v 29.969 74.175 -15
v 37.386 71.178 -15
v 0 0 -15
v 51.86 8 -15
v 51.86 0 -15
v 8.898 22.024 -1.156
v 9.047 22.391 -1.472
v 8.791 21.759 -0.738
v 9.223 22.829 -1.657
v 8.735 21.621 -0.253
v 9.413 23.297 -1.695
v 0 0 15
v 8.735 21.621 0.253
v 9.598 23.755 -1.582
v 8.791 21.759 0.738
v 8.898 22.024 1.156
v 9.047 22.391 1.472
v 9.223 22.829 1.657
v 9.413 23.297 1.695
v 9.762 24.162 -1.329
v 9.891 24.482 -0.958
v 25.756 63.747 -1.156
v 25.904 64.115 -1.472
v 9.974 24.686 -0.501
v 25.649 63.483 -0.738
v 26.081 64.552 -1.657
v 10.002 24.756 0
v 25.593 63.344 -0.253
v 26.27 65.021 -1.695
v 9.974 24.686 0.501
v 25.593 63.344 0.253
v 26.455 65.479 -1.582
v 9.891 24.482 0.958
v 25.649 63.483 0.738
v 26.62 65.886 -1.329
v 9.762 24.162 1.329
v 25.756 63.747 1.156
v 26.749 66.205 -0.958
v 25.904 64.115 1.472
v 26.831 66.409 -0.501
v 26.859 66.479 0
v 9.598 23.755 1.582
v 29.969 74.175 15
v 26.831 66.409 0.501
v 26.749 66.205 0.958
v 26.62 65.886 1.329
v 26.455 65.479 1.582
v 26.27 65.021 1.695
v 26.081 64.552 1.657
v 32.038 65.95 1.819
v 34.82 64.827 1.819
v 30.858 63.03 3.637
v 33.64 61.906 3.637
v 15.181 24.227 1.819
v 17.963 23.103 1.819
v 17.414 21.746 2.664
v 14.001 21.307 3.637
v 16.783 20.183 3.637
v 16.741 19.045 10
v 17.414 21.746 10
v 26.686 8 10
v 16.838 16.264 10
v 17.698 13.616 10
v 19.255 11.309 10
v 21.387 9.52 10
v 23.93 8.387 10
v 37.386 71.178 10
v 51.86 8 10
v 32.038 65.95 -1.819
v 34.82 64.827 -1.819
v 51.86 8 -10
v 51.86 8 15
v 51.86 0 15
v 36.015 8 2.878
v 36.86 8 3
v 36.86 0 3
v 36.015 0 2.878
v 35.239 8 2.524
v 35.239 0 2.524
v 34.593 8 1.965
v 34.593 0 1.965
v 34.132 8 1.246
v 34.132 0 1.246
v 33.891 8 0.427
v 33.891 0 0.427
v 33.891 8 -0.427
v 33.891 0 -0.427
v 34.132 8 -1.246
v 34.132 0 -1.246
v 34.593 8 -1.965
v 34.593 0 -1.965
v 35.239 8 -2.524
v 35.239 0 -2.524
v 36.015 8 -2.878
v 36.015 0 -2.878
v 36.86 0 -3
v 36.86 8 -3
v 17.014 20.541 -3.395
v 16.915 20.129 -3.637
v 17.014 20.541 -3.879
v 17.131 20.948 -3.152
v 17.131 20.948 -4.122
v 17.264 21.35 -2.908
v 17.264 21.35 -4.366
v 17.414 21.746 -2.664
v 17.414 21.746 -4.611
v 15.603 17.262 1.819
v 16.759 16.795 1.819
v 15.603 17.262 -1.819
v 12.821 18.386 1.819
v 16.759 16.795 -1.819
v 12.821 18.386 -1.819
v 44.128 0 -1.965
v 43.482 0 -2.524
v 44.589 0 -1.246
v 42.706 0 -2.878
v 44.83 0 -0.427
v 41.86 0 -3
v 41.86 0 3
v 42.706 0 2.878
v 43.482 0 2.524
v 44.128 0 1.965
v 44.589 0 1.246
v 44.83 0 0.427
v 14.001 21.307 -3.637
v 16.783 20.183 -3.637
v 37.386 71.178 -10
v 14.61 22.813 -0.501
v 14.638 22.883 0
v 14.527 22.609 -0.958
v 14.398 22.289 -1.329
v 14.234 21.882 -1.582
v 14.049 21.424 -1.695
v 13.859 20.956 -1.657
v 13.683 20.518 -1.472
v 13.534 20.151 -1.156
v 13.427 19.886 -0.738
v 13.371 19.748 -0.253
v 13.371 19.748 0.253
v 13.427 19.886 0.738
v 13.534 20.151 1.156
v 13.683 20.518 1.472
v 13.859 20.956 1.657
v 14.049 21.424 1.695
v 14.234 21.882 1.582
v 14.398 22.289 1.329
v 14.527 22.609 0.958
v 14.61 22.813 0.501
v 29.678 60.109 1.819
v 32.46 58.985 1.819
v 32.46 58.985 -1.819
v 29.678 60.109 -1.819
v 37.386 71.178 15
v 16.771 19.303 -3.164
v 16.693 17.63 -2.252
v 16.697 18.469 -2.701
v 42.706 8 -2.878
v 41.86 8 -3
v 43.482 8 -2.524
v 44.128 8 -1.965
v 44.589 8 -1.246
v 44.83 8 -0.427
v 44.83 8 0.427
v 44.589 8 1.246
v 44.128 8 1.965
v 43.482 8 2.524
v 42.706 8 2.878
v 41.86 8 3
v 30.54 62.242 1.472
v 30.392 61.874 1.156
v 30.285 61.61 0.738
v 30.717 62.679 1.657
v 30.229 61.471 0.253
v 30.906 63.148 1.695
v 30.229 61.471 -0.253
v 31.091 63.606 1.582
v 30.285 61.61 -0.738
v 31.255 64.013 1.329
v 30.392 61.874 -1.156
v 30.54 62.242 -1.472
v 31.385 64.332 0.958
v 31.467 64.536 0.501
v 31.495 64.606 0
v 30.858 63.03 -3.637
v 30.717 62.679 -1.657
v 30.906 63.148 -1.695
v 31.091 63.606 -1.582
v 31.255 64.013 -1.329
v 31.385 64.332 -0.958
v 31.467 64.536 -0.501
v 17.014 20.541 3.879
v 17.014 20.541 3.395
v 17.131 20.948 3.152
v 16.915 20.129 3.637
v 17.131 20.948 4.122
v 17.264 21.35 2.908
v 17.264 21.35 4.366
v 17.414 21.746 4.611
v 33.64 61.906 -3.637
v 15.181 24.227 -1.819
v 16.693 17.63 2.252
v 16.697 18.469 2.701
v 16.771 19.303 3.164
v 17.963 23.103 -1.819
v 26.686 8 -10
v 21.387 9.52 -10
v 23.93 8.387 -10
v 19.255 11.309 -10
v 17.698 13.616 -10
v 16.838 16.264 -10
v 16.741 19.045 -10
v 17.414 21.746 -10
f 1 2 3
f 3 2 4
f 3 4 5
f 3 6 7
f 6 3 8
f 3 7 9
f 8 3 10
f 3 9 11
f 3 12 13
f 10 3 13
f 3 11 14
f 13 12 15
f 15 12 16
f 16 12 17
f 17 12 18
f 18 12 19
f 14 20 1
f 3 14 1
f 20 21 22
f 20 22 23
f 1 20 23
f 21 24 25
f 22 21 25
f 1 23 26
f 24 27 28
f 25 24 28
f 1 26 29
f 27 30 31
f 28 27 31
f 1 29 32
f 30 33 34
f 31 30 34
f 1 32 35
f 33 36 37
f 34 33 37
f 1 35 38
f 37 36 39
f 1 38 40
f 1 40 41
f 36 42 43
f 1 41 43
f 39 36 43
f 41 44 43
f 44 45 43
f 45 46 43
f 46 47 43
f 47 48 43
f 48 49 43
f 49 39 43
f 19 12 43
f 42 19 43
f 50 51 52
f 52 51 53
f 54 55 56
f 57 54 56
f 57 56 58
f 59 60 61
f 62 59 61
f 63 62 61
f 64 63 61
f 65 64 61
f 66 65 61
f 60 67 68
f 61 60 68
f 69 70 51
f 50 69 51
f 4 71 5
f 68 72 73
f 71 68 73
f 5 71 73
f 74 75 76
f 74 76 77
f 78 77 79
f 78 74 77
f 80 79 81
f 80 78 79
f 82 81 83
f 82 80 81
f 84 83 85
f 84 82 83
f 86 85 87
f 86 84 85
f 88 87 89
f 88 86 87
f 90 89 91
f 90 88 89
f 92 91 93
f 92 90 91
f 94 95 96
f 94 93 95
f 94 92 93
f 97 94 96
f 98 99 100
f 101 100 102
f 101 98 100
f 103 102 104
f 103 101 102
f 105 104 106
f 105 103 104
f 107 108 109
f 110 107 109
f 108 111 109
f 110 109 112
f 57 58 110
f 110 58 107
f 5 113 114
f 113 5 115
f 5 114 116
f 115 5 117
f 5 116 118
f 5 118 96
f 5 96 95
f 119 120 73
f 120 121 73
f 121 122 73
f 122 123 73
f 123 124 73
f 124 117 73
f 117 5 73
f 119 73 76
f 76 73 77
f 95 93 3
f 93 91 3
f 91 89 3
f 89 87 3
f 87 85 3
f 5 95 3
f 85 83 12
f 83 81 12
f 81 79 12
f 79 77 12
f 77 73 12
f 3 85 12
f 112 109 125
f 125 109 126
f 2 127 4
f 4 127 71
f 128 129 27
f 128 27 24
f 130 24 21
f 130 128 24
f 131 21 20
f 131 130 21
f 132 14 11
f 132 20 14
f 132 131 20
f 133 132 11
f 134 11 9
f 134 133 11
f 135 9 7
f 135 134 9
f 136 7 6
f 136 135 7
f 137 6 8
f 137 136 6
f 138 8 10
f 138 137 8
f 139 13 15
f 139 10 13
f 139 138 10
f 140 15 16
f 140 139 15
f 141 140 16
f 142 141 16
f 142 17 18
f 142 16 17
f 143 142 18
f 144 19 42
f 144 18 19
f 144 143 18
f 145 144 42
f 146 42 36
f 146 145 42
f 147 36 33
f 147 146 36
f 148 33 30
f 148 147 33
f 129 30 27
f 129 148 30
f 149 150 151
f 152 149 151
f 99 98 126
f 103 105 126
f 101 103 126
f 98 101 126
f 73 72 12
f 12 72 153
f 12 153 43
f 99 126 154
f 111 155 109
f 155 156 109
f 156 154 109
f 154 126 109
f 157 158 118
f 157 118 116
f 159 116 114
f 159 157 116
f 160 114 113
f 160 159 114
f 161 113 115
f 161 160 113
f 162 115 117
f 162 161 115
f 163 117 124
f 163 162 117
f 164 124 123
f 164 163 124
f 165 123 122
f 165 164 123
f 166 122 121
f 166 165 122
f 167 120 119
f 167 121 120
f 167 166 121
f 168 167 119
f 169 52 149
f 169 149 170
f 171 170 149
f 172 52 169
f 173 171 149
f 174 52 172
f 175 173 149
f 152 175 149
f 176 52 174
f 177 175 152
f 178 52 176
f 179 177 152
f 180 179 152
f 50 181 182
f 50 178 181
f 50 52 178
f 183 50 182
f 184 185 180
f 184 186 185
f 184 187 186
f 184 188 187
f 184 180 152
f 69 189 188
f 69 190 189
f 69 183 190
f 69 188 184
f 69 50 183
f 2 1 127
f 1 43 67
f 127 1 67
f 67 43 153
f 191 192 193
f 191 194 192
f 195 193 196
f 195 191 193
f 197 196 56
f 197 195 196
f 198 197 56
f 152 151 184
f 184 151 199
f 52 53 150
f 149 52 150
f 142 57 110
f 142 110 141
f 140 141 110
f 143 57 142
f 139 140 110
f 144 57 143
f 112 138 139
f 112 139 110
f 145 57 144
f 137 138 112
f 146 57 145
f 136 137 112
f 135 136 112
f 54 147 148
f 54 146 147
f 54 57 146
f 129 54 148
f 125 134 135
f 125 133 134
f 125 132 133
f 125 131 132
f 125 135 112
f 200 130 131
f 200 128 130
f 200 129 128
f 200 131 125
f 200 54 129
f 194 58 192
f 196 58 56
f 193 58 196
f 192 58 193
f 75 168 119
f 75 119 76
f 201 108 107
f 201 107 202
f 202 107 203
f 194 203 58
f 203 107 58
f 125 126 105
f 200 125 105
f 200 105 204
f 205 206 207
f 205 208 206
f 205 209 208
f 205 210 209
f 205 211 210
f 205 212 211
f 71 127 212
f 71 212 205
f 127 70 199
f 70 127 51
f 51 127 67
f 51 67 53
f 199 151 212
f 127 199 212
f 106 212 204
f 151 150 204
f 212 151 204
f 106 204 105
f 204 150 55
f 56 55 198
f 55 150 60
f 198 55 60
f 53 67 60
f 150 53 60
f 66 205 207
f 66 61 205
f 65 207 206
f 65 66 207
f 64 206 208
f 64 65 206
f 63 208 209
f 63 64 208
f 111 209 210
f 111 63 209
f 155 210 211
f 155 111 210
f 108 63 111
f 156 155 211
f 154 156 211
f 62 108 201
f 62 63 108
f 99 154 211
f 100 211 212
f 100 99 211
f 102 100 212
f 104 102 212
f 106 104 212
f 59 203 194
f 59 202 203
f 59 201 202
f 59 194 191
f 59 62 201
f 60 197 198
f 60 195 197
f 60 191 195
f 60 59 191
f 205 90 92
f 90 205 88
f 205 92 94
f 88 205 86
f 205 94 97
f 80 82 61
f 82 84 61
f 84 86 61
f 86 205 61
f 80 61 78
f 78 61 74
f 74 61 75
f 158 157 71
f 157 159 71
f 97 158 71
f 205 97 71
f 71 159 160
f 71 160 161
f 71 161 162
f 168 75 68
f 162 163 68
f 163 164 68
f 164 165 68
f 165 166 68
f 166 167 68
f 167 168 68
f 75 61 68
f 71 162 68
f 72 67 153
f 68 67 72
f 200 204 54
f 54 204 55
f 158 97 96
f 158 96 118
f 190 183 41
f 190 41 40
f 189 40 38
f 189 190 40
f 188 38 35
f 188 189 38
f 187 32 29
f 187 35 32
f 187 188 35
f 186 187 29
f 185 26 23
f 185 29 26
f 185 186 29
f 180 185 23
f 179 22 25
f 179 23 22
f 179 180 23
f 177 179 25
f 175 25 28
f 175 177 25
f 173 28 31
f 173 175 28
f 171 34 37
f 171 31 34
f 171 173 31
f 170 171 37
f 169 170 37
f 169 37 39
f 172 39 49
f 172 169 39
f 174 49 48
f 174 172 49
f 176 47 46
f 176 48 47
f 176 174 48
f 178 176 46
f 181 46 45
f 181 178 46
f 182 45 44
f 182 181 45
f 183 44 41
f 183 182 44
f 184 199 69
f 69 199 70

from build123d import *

# Parameters (mm, degrees)
BOSS_EXTRUDE1_DEPTH           = 15
CUT_EXTRUDE1_DEPTH            = 86.172406393
RIB1_REACH                    = 97.349
SKETCH4_WALL_W                = 257.512394394
SKETCH4_WALL_H                = 5
M3_CLEARANCE_HOLE1_AT_2_COUNT = 2
M3_CLEARANCE_HOLE1_AT_2_PITCH = 45
CUT_EXTRUDE2_DEPTH            = 3
FILLET1_R                     = 10


with BuildPart() as part:
    # Sketch1 → Boss-Extrude1 (new, symmetric)
    with BuildSketch(Plane.XY):
        Polygon((0, 0), (29.968527473, 74.174708365), (37.38599831, 71.177855618), (11.860487748, 8), (51.860487748, 8), (51.860487748, 0), align=None)
    extrude(amount=BOSS_EXTRUDE1_DEPTH, both=True)

    # Sketch2 → Cut-Extrude1 (cut, through all)
    with BuildSketch(Plane(origin=(0.379940125, 8, 0), x_dir=(1, 0, 0), z_dir=(0, 1, 0))):
        with BuildLine():
            Line((41.480547623, -3), (36.480547623, -3))
            ThreePointArc((36.480547623, -3), (33.480547623, 0), (36.480547623, 3))
            Line((36.480547623, 3), (41.480547623, 3))
            ThreePointArc((41.480547623, 3), (44.480547623, 0), (41.480547623, -3))
        make_face()
    extrude(amount=-CUT_EXTRUDE1_DEPTH, mode=Mode.SUBTRACT)

    # Sketch4 wall → Rib1 (add, up to next)
    with BuildSketch(Plane(origin=(44.623243029, 39.588927809, 15), x_dir=(0.223320905083, -0.974744978624, 0), z_dir=(0.974744978624, 0.223320905083, 0)), mode=Mode.PRIVATE) as rib1_sk1:
        with Locations((0, 2.5)):
            Rectangle(SKETCH4_WALL_W, SKETCH4_WALL_H)
    rib1_tool1 = extrude(rib1_sk1.sketch, amount=-RIB1_REACH, mode=Mode.PRIVATE) - part.part
    rib1 = rib1_tool1.solids().sort_by_distance((44.623243029, 39.588927809, 15))[0]
    add(rib1)

    # Mirror1: Rib1 across plane
    add(rib1.mirror(Plane.XY))

    # Sketch7 → M3 Clearance Hole1 (revolve, cut)
    with BuildSketch(Plane(origin=(33.639932376, 61.906017072, 0), x_dir=(0.37460659341591607, 0.9271838545667858, 0), z_dir=(0, 0, 1))):
        Polygon((0, 0), (0, 35.786334818), (1.7, 35.786334818), (1.7, 0.025), (1.725, 0), align=None)
    m3_clearance_hole1 = revolve(axis=Axis((39.527549852, 59.527265204, 0), (-0.9271838545667858, 0.37460659341591607, 0)), mode=Mode.SUBTRACT)

    # M3 Clearance Hole1 at 2: M3 Clearance Hole1 ×2
    with Locations(*[Vector(-0.37460659341591607, -0.9271838545667858, 0) * (i * M3_CLEARANCE_HOLE1_AT_2_PITCH) for i in range(1, M3_CLEARANCE_HOLE1_AT_2_COUNT)]):
        add(m3_clearance_hole1, mode=Mode.SUBTRACT)

    # Sketch8 → Cut-Extrude2 (cut)
    with BuildSketch(Plane(origin=(7.417470837, -2.996852747, 0), x_dir=(0, 0, -1), z_dir=(0.9271838545667858, -0.37460659341591607, 0))):
        Polygon((3.637306696, 70), (1.818653348, 73.15), (-1.818653348, 73.15), (-3.637306696, 70), (-1.818653348, 66.85), (1.818653348, 66.85), align=None)
        Polygon((3.637306696, 25), (1.818653348, 28.15), (-1.818653348, 28.15), (-3.637306696, 25), (-1.818653348, 21.85), (1.818653348, 21.85), align=None)
    extrude(amount=-CUT_EXTRUDE2_DEPTH, mode=Mode.SUBTRACT)

    # Fillet1
    # the kernel refuses this fillet: 10 mm, written as the material it adds along each edge
    with BuildSketch(Plane(origin=(11.860487748, 8, 47.064024213), x_dir=(0.3746065934159096, 0.9271838545667884, 0), z_dir=(0, 0, -1))) as fillet1_piece_1_section:
        with BuildLine():
            CenterArc((FILLET1_R * 1.48256096851, FILLET1_R), FILLET1_R, 158, 112)
            Line((FILLET1_R * 0.555377113946, FILLET1_R * 1.37460659342), (0, 0))
            Line((0, 0), (FILLET1_R * 1.48256096851, 0))
        make_face()
    fillet1_piece_1 = extrude(amount=94.128048426, mode=Mode.PRIVATE)
    fillet1_piece_1 = split(fillet1_piece_1, bisect_by=Plane(origin=(16.410561538, 18.315636212, 15), z_dir=(0, 0, -1)), keep=Keep.TOP, mode=Mode.PRIVATE)
    fillet1_piece_1 = split(fillet1_piece_1, bisect_by=Plane(origin=(17.191225171, 20.247846508, 3.760526332), z_dir=(-0.18730329670795798, -0.46359192728339266, 0.866025403784439)), keep=Keep.TOP, mode=Mode.PRIVATE)
    add(fillet1_piece_1)
    with BuildSketch(Plane(origin=(11.860487748, 8, 47.064024213), x_dir=(0.3746065934159096, 0.9271838545667884, 0), z_dir=(0, 0, -1))) as fillet1_piece_2_section:
        with BuildLine():
            CenterArc((FILLET1_R * 1.48256096851, FILLET1_R), FILLET1_R, 158, 112)
            Line((FILLET1_R * 0.555377113946, FILLET1_R * 1.37460659342), (0, 0))
            Line((0, 0), (FILLET1_R * 1.48256096851, 0))
        make_face()
    fillet1_piece_2 = extrude(amount=94.128048426, mode=Mode.PRIVATE)
    fillet1_piece_2 = split(fillet1_piece_2, bisect_by=Plane(origin=(16.998453552, 20.640654754, 3.929107959), z_dir=(0.18730329670795798, 0.46359192728339266, -0.866025403784439)), keep=Keep.TOP, mode=Mode.PRIVATE)
    fillet1_piece_2 = split(fillet1_piece_2, bisect_by=Plane(origin=(16.998453552, 20.640654754, 3.345505432), z_dir=(0.18730329670795837, 0.4635919272833937, 0.8660254037844384)), keep=Keep.TOP, mode=Mode.PRIVATE)
    add(fillet1_piece_2)
    with BuildSketch(Plane(origin=(11.860487748, 8, 47.064024213), x_dir=(0.3746065934159096, 0.9271838545667884, 0), z_dir=(0, 0, -1))) as fillet1_piece_3_section:
        with BuildLine():
            CenterArc((FILLET1_R * 1.48256096851, FILLET1_R), FILLET1_R, 158, 112)
            Line((FILLET1_R * 0.555377113946, FILLET1_R * 1.37460659342), (0, 0))
            Line((0, 0), (FILLET1_R * 1.48256096851, 0))
        make_face()
    fillet1_piece_3 = extrude(amount=57.064024213, mode=Mode.PRIVATE)
    fillet1_piece_3 = split(fillet1_piece_3, bisect_by=Plane(origin=(16.596548346, 16.860543337, 0), z_dir=(-0.3746065934159161, -0.9271838545667858, 0)), keep=Keep.TOP, mode=Mode.PRIVATE)
    fillet1_piece_3 = split(fillet1_piece_3, bisect_by=Plane(origin=(17.125135573, 18.168842634, 4.641292114), z_dir=(-0.18730329670795837, -0.4635919272833937, -0.8660254037844384)), keep=Keep.TOP, mode=Mode.PRIVATE)
    add(fillet1_piece_3)
    with BuildSketch(Plane(origin=(11.860487748, 8, 47.064024213), x_dir=(0.3746065934159096, 0.9271838545667884, 0), z_dir=(0, 0, -1))) as fillet1_piece_4_section:
        with BuildLine():
            CenterArc((FILLET1_R * 1.48256096851, FILLET1_R), FILLET1_R, 158, 112)
            Line((FILLET1_R * 0.555377113946, FILLET1_R * 1.37460659342), (0, 0))
            Line((0, 0), (FILLET1_R * 1.48256096851, 0))
        make_face()
    fillet1_piece_4 = extrude(amount=57.064024213, mode=Mode.PRIVATE)
    fillet1_piece_4 = split(fillet1_piece_4, bisect_by=Plane(origin=(16.526523366, 18.36657569, -2.60970235), z_dir=(-0.18730329670795812, -0.463591927283393, -0.8660254037844388)), keep=Keep.TOP, mode=Mode.PRIVATE)
    add(fillet1_piece_4)
    with BuildSketch(Plane(origin=(11.860487748, 8, 47.064024213), x_dir=(0.3746065934159096, 0.9271838545667884, 0), z_dir=(0, 0, -1))) as fillet1_piece_5_section:
        with BuildLine():
            CenterArc((FILLET1_R * 1.48256096851, FILLET1_R), FILLET1_R, 158, 112)
            Line((FILLET1_R * 0.555377113946, FILLET1_R * 1.37460659342), (0, 0))
            Line((0, 0), (FILLET1_R * 1.48256096851, 0))
        make_face()
    fillet1_piece_5 = extrude(amount=94.128048426, mode=Mode.PRIVATE)
    fillet1_piece_5 = split(fillet1_piece_5, bisect_by=Plane(origin=(16.998453552, 20.640654754, -3.929107959), z_dir=(0.18730329670795812, 0.463591927283393, 0.8660254037844388)), keep=Keep.TOP, mode=Mode.PRIVATE)
    fillet1_piece_5 = split(fillet1_piece_5, bisect_by=Plane(origin=(16.998453552, 20.640654754, -3.345505432), z_dir=(0.18730329670795812, 0.4635919272833931, -0.8660254037844387)), keep=Keep.TOP, mode=Mode.PRIVATE)
    add(fillet1_piece_5)


solid = part.part
